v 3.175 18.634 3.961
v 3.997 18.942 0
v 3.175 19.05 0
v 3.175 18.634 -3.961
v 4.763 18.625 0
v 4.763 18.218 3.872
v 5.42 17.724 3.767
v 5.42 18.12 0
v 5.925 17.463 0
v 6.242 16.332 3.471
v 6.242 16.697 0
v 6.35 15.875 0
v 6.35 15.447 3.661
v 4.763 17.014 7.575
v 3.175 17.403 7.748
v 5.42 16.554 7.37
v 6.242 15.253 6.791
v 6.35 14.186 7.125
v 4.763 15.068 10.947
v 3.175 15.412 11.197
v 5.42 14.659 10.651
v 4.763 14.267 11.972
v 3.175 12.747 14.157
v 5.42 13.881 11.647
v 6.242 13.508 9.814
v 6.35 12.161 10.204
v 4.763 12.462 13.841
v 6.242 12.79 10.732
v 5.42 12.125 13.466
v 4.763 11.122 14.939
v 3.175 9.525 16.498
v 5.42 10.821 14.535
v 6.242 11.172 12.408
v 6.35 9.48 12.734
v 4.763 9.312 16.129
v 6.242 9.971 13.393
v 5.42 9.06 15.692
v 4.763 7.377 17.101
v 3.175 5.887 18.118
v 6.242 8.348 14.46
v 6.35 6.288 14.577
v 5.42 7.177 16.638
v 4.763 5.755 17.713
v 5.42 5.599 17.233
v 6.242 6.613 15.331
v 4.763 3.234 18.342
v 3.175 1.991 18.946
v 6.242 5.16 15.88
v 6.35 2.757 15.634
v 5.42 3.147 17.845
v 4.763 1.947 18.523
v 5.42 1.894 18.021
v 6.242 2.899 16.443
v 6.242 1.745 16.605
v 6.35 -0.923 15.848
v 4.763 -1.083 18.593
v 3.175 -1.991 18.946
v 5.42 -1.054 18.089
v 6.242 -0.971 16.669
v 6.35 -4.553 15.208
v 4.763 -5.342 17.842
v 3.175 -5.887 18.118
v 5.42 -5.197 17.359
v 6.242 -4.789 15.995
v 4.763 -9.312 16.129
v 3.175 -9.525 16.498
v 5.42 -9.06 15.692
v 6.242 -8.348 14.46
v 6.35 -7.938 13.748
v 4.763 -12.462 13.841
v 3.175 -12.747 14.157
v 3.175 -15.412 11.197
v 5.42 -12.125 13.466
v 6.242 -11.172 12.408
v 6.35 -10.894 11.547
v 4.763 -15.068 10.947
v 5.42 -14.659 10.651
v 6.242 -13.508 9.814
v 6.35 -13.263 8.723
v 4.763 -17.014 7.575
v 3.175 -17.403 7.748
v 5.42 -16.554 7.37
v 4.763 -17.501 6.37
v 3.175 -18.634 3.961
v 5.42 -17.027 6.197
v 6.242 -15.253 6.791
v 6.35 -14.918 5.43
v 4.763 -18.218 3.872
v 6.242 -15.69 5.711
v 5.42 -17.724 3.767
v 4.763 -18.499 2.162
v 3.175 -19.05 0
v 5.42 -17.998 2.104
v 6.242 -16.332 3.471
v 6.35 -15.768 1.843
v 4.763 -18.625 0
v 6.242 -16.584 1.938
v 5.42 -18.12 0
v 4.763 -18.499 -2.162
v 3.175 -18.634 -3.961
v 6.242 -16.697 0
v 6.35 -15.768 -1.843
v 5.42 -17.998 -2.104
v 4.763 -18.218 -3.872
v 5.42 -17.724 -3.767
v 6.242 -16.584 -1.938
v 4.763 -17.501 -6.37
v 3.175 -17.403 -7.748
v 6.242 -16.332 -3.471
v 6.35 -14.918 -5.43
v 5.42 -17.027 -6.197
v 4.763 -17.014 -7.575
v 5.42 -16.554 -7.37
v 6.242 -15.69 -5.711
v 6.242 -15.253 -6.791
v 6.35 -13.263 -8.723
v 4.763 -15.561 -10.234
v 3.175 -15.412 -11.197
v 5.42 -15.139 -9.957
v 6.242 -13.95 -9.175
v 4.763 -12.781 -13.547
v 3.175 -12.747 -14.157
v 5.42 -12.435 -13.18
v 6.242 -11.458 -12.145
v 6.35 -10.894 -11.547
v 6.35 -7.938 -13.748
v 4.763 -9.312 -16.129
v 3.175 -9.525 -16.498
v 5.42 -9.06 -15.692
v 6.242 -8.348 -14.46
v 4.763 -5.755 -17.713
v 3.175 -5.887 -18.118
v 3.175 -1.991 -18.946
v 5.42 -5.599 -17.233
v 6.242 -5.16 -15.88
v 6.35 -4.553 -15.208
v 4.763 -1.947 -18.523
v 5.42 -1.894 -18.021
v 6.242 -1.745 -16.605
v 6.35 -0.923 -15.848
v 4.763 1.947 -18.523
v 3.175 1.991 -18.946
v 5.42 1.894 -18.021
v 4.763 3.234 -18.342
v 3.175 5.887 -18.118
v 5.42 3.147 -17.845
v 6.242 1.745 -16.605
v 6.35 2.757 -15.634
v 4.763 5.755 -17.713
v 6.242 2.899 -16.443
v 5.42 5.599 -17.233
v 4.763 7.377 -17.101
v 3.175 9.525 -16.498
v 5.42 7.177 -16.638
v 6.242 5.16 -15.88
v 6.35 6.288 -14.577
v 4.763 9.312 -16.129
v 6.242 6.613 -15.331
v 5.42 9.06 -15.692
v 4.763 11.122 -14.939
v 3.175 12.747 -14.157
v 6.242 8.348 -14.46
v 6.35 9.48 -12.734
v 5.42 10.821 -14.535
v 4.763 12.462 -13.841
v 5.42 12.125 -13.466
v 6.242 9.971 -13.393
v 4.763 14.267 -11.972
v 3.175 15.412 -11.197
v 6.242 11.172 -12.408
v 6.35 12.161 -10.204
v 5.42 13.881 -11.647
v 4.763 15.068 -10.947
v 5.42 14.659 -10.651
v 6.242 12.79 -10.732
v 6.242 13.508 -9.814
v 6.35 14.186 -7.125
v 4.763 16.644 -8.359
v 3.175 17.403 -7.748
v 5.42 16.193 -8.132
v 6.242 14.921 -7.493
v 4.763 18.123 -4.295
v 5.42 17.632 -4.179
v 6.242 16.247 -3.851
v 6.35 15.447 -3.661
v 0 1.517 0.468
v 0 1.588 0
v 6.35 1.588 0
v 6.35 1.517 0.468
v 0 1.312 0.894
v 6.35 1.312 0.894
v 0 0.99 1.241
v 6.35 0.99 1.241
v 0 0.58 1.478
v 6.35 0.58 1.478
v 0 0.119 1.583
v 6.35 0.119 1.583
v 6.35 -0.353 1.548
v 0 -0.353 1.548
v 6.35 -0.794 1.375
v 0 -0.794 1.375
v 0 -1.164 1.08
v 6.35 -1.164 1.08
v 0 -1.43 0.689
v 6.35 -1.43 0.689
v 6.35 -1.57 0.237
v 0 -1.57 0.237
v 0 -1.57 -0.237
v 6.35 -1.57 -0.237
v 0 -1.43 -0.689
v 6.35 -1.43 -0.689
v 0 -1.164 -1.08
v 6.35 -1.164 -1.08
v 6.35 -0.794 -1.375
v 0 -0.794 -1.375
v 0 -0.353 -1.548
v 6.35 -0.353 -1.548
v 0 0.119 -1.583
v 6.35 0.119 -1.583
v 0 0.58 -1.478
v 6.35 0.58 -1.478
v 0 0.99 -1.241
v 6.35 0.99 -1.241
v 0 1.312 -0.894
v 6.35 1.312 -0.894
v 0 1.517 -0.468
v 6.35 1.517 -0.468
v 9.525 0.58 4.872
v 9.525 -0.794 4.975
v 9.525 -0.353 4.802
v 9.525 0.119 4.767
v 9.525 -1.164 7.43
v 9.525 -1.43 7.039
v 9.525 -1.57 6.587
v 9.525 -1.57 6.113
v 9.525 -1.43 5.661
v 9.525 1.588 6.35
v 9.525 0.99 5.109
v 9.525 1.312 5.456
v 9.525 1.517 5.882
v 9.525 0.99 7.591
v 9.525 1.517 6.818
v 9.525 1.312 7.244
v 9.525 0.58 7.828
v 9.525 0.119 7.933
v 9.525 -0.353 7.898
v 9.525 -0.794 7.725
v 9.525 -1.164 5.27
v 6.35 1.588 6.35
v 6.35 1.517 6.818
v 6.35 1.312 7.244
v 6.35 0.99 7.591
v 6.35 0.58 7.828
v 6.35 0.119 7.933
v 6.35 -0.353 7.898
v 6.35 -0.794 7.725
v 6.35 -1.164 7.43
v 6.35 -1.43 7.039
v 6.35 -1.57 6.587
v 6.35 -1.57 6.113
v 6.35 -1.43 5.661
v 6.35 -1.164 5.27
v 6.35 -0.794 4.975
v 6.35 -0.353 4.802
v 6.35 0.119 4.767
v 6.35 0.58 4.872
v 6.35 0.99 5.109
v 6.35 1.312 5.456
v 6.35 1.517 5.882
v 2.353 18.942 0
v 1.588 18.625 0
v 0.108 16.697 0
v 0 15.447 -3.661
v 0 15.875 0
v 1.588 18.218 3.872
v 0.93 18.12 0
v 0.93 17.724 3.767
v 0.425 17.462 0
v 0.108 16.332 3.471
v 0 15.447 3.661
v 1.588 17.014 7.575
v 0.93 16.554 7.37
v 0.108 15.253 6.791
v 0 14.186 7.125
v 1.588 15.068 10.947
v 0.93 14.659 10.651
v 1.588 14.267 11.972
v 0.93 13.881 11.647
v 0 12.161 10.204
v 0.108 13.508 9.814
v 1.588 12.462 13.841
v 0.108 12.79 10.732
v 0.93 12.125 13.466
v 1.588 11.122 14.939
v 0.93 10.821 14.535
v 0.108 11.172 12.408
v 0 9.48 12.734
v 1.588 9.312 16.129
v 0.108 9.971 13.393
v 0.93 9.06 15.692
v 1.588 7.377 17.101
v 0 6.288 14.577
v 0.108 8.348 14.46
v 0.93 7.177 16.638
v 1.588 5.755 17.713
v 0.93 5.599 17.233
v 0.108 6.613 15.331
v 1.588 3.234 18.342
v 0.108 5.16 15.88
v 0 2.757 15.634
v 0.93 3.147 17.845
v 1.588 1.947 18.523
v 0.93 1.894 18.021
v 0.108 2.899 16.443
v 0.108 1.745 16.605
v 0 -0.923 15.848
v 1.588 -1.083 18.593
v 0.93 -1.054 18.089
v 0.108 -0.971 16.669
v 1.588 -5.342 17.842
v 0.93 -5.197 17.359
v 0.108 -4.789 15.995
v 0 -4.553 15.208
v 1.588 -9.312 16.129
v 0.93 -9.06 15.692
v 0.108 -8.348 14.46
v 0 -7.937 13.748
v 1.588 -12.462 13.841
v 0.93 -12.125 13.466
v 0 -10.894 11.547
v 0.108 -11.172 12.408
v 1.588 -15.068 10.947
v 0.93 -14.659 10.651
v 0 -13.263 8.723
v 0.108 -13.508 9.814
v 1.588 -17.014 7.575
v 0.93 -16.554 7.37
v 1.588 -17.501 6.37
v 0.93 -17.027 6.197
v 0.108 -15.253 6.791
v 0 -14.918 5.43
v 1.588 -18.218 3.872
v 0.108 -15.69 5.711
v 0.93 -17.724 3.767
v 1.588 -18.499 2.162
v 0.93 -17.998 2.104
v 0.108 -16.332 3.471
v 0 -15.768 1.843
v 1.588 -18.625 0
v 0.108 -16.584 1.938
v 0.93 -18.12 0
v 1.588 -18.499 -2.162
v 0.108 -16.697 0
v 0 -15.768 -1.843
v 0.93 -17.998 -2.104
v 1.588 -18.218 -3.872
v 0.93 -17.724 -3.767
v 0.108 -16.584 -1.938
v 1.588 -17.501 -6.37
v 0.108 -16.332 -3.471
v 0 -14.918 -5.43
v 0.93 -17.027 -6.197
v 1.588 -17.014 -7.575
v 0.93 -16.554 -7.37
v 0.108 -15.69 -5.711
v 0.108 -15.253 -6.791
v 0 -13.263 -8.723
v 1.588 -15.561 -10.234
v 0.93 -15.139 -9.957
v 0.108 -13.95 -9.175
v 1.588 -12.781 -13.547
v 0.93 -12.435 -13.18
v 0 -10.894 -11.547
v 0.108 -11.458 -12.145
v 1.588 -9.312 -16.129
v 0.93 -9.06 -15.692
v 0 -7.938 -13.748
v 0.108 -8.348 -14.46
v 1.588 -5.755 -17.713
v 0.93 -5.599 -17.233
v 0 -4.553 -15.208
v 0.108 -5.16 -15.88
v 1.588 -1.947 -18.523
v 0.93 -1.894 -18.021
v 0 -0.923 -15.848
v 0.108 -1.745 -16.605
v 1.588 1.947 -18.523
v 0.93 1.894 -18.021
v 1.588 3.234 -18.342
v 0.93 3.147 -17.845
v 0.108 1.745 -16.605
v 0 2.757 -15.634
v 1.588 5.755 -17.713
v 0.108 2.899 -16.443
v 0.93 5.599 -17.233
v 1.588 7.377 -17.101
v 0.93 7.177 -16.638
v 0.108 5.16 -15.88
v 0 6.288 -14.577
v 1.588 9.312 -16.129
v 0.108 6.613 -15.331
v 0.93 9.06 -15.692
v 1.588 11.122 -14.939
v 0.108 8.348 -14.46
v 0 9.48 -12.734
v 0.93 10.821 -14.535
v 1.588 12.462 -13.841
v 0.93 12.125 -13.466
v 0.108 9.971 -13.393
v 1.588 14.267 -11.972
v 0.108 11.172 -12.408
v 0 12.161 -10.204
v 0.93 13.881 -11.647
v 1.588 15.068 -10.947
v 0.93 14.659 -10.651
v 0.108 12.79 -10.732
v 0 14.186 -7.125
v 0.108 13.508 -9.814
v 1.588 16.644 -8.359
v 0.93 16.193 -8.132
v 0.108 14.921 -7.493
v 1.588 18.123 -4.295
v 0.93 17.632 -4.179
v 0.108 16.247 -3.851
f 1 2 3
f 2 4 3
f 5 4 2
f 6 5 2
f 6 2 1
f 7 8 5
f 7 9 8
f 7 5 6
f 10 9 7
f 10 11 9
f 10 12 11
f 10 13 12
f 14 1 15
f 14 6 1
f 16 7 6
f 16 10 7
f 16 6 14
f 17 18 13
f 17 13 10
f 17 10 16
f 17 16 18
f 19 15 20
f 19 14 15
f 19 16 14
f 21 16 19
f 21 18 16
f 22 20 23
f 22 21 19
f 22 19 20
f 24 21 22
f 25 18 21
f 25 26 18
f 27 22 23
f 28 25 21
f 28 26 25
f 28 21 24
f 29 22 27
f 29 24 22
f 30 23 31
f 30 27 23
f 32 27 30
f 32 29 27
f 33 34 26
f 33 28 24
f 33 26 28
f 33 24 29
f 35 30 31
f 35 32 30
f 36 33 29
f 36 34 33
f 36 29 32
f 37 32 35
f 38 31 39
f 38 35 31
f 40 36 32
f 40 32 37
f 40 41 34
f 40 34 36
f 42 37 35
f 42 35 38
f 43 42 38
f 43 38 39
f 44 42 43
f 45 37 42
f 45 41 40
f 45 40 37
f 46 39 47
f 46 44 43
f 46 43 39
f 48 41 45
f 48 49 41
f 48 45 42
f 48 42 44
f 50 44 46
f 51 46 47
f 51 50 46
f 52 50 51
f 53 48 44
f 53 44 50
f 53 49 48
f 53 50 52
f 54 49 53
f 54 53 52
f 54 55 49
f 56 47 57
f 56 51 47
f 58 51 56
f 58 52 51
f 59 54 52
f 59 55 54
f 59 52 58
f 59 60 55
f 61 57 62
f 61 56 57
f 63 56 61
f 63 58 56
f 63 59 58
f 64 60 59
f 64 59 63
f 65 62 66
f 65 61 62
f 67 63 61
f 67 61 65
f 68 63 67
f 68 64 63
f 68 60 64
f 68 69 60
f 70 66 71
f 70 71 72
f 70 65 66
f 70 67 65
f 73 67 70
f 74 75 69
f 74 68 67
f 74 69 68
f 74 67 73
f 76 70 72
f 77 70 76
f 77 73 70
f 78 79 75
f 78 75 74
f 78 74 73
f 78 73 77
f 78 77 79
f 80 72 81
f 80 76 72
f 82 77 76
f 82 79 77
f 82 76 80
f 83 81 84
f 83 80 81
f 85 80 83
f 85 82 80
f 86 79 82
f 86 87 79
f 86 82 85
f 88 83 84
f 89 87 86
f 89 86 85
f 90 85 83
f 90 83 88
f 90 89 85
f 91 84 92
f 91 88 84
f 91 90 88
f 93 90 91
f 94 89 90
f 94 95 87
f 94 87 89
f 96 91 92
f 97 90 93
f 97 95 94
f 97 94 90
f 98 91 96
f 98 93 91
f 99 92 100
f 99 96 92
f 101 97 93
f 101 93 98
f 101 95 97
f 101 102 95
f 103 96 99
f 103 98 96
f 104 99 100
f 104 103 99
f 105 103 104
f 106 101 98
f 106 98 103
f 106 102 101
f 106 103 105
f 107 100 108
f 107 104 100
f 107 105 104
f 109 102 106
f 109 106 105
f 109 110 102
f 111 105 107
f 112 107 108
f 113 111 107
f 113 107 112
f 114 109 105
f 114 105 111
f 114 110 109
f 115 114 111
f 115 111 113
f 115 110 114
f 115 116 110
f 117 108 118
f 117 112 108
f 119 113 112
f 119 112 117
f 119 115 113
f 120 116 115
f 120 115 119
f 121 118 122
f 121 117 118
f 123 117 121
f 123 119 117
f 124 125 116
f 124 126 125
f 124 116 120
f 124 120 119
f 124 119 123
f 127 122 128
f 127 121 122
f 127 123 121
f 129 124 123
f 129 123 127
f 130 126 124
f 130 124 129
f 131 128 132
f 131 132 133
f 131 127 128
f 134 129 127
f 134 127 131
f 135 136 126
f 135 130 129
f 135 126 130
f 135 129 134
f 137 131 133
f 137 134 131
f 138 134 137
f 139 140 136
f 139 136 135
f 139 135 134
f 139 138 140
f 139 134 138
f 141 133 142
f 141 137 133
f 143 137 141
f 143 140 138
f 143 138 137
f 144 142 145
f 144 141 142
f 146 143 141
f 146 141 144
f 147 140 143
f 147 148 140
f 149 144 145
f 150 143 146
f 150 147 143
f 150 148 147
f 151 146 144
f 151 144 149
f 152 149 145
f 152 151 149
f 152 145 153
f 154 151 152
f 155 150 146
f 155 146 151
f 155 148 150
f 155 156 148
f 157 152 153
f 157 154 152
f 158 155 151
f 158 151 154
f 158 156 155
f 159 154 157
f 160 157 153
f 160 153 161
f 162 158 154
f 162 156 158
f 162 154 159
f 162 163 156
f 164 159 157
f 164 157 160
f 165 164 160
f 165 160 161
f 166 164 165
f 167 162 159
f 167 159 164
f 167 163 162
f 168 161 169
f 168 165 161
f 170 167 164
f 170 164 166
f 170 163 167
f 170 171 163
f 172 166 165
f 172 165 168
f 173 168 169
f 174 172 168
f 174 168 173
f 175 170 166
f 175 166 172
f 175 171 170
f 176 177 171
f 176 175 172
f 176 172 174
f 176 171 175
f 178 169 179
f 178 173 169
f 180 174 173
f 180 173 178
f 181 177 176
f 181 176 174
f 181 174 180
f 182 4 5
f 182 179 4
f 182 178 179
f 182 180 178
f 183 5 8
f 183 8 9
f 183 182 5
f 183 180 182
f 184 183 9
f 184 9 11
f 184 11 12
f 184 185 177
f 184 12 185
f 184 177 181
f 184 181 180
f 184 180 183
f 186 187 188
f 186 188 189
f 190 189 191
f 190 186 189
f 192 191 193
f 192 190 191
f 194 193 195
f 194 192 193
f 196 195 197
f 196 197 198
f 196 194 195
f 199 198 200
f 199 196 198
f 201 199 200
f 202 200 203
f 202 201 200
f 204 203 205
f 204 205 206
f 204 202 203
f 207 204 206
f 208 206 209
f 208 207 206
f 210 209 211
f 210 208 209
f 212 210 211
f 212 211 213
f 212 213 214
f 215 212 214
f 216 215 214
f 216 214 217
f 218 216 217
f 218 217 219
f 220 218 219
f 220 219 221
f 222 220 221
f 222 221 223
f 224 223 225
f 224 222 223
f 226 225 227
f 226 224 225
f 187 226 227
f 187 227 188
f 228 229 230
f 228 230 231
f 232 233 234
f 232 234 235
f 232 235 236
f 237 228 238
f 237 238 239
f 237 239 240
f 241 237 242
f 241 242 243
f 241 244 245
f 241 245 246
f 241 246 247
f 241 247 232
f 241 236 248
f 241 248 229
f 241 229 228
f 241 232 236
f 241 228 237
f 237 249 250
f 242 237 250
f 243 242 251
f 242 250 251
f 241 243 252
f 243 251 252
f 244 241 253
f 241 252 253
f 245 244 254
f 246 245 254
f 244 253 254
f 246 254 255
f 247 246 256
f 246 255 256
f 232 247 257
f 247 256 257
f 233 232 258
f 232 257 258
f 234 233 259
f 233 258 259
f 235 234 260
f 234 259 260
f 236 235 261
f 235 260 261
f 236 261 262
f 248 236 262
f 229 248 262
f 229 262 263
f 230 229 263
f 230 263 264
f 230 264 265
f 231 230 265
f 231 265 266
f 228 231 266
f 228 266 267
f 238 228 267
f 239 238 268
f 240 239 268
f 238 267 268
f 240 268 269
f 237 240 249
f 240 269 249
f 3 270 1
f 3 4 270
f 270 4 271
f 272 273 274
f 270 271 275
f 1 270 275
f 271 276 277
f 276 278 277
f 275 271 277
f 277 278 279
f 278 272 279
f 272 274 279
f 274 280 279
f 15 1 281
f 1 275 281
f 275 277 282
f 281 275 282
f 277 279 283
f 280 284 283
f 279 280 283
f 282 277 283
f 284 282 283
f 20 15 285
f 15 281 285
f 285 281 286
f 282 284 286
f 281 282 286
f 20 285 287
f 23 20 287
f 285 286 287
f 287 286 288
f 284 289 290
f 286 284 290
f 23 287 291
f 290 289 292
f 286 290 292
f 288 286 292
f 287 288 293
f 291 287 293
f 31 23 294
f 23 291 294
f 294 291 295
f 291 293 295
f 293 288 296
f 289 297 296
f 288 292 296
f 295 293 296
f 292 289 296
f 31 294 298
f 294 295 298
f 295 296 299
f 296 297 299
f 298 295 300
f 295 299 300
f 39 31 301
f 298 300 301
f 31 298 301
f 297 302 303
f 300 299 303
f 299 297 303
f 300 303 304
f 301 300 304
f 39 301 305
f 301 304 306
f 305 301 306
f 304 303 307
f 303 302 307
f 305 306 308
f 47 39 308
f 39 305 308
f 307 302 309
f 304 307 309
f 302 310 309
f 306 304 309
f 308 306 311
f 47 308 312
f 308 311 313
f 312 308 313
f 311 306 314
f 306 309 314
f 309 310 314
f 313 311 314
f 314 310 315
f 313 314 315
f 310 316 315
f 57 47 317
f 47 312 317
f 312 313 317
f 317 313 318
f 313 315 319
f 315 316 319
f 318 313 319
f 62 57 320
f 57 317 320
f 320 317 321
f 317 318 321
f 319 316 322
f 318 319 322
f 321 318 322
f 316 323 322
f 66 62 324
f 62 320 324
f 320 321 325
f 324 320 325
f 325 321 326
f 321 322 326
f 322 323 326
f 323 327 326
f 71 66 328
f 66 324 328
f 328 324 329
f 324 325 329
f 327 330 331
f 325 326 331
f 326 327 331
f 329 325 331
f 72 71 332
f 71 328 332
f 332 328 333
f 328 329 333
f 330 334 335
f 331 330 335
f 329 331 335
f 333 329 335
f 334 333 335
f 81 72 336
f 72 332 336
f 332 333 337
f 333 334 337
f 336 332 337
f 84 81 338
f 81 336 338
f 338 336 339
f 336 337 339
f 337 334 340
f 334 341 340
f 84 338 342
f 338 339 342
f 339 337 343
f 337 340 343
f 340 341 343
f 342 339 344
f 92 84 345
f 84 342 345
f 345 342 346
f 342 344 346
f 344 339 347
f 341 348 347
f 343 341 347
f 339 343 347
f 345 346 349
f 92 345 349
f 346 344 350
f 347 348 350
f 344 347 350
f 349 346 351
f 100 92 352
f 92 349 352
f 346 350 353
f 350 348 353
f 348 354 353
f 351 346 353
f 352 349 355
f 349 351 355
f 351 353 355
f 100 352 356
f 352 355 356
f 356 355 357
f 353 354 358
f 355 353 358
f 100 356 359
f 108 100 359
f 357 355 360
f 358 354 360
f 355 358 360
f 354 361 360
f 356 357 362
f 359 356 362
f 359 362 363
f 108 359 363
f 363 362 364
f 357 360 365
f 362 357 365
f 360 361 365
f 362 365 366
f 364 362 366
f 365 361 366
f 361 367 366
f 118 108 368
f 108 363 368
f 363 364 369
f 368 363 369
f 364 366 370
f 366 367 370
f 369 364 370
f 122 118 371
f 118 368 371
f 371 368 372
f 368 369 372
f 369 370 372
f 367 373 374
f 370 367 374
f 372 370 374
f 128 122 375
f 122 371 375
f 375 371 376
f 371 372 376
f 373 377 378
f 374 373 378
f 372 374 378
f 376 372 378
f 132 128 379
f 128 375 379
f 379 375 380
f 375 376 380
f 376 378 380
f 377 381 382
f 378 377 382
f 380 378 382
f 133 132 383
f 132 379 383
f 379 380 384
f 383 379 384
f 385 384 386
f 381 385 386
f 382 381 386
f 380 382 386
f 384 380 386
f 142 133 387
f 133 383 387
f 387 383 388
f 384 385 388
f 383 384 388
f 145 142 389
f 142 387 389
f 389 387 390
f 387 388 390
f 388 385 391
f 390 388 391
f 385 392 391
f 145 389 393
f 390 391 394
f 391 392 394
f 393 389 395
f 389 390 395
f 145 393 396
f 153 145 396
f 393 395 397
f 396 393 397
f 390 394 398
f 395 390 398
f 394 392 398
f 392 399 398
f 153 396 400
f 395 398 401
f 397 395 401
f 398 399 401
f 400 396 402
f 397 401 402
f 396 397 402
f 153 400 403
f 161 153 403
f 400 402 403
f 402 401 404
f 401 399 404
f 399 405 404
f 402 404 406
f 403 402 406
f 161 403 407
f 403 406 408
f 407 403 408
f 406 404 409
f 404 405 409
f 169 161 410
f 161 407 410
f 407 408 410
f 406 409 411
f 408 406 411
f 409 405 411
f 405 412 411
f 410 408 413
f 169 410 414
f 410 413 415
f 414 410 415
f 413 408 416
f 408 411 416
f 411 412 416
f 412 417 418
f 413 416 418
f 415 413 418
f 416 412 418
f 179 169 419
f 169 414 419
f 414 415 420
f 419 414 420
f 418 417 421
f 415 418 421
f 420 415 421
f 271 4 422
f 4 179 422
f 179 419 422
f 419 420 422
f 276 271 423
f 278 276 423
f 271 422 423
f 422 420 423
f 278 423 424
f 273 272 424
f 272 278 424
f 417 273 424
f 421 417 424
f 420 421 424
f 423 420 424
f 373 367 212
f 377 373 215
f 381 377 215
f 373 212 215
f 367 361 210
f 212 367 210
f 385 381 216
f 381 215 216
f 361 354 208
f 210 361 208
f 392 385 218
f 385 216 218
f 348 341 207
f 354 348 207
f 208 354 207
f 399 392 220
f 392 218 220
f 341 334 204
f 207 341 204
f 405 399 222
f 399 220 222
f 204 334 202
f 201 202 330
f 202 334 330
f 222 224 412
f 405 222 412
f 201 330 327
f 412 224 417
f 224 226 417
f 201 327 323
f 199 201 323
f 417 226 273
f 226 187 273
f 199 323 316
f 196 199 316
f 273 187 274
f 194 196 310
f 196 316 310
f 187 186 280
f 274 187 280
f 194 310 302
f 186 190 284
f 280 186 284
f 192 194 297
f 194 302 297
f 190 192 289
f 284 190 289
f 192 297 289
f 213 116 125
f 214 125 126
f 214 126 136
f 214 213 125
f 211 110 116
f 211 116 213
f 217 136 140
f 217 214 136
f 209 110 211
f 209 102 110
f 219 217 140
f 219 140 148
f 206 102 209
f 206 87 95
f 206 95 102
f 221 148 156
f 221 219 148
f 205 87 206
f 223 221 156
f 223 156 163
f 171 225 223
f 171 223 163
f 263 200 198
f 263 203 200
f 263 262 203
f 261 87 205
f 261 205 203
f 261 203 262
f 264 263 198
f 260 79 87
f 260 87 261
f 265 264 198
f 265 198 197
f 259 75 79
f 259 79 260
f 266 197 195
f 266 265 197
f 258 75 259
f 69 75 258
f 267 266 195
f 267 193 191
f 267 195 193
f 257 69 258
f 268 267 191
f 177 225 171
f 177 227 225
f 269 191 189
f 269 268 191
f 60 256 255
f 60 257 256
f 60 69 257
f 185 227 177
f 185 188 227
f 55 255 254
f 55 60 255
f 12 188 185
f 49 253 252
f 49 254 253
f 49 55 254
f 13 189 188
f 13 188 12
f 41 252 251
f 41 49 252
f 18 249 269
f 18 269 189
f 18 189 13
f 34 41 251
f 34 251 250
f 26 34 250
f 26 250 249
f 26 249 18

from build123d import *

# Parameters (mm, degrees)
F0_R     = 19.05
F3_DEPTH = 6.35
F2_R     = 1.5875
F4_DEPTH = 6.35
F5_R     = 3.175
F6_R     = 3.17499
F7_R     = 1.5875
F8_DEPTH = 3.175


# Not quite as in the source:
# - a fillet or chamfer is up to 0.001 mm smaller than in the source, because OpenCascade refuses the exact size


with BuildPart() as f3:
    # F0 (on Right) → F3 (new body)
    with BuildSketch(Plane.YZ):
        Circle(F0_R)
    extrude(amount=F3_DEPTH)

    # F2 (on face) → F4 (cut)
    with BuildSketch(Plane.YZ):
        Circle(F2_R)
    extrude(amount=F4_DEPTH, mode=Mode.SUBTRACT)

    # F5
    f5_edges = [f3.edges().sort_by_distance(p)[0] for p in [
        (0, -19.05, 0),
    ]]
    fillet(f5_edges, radius=F5_R)

    # F6 (radius 3.175 in the source; OpenCascade refuses exactly that, so slightly less here)
    f6_edges = [f3.edges().sort_by_distance(p)[0] for p in [
        (6.35, -19.05, 0),
    ]]
    fillet(f6_edges, radius=F6_R)

    # F7 (on face) → F8 (join)
    with BuildSketch(Plane.YZ.offset(6.35)):
        with Locations((0, 6.35)):
            Circle(F7_R)
    extrude(amount=F8_DEPTH)


solid = f3.part
